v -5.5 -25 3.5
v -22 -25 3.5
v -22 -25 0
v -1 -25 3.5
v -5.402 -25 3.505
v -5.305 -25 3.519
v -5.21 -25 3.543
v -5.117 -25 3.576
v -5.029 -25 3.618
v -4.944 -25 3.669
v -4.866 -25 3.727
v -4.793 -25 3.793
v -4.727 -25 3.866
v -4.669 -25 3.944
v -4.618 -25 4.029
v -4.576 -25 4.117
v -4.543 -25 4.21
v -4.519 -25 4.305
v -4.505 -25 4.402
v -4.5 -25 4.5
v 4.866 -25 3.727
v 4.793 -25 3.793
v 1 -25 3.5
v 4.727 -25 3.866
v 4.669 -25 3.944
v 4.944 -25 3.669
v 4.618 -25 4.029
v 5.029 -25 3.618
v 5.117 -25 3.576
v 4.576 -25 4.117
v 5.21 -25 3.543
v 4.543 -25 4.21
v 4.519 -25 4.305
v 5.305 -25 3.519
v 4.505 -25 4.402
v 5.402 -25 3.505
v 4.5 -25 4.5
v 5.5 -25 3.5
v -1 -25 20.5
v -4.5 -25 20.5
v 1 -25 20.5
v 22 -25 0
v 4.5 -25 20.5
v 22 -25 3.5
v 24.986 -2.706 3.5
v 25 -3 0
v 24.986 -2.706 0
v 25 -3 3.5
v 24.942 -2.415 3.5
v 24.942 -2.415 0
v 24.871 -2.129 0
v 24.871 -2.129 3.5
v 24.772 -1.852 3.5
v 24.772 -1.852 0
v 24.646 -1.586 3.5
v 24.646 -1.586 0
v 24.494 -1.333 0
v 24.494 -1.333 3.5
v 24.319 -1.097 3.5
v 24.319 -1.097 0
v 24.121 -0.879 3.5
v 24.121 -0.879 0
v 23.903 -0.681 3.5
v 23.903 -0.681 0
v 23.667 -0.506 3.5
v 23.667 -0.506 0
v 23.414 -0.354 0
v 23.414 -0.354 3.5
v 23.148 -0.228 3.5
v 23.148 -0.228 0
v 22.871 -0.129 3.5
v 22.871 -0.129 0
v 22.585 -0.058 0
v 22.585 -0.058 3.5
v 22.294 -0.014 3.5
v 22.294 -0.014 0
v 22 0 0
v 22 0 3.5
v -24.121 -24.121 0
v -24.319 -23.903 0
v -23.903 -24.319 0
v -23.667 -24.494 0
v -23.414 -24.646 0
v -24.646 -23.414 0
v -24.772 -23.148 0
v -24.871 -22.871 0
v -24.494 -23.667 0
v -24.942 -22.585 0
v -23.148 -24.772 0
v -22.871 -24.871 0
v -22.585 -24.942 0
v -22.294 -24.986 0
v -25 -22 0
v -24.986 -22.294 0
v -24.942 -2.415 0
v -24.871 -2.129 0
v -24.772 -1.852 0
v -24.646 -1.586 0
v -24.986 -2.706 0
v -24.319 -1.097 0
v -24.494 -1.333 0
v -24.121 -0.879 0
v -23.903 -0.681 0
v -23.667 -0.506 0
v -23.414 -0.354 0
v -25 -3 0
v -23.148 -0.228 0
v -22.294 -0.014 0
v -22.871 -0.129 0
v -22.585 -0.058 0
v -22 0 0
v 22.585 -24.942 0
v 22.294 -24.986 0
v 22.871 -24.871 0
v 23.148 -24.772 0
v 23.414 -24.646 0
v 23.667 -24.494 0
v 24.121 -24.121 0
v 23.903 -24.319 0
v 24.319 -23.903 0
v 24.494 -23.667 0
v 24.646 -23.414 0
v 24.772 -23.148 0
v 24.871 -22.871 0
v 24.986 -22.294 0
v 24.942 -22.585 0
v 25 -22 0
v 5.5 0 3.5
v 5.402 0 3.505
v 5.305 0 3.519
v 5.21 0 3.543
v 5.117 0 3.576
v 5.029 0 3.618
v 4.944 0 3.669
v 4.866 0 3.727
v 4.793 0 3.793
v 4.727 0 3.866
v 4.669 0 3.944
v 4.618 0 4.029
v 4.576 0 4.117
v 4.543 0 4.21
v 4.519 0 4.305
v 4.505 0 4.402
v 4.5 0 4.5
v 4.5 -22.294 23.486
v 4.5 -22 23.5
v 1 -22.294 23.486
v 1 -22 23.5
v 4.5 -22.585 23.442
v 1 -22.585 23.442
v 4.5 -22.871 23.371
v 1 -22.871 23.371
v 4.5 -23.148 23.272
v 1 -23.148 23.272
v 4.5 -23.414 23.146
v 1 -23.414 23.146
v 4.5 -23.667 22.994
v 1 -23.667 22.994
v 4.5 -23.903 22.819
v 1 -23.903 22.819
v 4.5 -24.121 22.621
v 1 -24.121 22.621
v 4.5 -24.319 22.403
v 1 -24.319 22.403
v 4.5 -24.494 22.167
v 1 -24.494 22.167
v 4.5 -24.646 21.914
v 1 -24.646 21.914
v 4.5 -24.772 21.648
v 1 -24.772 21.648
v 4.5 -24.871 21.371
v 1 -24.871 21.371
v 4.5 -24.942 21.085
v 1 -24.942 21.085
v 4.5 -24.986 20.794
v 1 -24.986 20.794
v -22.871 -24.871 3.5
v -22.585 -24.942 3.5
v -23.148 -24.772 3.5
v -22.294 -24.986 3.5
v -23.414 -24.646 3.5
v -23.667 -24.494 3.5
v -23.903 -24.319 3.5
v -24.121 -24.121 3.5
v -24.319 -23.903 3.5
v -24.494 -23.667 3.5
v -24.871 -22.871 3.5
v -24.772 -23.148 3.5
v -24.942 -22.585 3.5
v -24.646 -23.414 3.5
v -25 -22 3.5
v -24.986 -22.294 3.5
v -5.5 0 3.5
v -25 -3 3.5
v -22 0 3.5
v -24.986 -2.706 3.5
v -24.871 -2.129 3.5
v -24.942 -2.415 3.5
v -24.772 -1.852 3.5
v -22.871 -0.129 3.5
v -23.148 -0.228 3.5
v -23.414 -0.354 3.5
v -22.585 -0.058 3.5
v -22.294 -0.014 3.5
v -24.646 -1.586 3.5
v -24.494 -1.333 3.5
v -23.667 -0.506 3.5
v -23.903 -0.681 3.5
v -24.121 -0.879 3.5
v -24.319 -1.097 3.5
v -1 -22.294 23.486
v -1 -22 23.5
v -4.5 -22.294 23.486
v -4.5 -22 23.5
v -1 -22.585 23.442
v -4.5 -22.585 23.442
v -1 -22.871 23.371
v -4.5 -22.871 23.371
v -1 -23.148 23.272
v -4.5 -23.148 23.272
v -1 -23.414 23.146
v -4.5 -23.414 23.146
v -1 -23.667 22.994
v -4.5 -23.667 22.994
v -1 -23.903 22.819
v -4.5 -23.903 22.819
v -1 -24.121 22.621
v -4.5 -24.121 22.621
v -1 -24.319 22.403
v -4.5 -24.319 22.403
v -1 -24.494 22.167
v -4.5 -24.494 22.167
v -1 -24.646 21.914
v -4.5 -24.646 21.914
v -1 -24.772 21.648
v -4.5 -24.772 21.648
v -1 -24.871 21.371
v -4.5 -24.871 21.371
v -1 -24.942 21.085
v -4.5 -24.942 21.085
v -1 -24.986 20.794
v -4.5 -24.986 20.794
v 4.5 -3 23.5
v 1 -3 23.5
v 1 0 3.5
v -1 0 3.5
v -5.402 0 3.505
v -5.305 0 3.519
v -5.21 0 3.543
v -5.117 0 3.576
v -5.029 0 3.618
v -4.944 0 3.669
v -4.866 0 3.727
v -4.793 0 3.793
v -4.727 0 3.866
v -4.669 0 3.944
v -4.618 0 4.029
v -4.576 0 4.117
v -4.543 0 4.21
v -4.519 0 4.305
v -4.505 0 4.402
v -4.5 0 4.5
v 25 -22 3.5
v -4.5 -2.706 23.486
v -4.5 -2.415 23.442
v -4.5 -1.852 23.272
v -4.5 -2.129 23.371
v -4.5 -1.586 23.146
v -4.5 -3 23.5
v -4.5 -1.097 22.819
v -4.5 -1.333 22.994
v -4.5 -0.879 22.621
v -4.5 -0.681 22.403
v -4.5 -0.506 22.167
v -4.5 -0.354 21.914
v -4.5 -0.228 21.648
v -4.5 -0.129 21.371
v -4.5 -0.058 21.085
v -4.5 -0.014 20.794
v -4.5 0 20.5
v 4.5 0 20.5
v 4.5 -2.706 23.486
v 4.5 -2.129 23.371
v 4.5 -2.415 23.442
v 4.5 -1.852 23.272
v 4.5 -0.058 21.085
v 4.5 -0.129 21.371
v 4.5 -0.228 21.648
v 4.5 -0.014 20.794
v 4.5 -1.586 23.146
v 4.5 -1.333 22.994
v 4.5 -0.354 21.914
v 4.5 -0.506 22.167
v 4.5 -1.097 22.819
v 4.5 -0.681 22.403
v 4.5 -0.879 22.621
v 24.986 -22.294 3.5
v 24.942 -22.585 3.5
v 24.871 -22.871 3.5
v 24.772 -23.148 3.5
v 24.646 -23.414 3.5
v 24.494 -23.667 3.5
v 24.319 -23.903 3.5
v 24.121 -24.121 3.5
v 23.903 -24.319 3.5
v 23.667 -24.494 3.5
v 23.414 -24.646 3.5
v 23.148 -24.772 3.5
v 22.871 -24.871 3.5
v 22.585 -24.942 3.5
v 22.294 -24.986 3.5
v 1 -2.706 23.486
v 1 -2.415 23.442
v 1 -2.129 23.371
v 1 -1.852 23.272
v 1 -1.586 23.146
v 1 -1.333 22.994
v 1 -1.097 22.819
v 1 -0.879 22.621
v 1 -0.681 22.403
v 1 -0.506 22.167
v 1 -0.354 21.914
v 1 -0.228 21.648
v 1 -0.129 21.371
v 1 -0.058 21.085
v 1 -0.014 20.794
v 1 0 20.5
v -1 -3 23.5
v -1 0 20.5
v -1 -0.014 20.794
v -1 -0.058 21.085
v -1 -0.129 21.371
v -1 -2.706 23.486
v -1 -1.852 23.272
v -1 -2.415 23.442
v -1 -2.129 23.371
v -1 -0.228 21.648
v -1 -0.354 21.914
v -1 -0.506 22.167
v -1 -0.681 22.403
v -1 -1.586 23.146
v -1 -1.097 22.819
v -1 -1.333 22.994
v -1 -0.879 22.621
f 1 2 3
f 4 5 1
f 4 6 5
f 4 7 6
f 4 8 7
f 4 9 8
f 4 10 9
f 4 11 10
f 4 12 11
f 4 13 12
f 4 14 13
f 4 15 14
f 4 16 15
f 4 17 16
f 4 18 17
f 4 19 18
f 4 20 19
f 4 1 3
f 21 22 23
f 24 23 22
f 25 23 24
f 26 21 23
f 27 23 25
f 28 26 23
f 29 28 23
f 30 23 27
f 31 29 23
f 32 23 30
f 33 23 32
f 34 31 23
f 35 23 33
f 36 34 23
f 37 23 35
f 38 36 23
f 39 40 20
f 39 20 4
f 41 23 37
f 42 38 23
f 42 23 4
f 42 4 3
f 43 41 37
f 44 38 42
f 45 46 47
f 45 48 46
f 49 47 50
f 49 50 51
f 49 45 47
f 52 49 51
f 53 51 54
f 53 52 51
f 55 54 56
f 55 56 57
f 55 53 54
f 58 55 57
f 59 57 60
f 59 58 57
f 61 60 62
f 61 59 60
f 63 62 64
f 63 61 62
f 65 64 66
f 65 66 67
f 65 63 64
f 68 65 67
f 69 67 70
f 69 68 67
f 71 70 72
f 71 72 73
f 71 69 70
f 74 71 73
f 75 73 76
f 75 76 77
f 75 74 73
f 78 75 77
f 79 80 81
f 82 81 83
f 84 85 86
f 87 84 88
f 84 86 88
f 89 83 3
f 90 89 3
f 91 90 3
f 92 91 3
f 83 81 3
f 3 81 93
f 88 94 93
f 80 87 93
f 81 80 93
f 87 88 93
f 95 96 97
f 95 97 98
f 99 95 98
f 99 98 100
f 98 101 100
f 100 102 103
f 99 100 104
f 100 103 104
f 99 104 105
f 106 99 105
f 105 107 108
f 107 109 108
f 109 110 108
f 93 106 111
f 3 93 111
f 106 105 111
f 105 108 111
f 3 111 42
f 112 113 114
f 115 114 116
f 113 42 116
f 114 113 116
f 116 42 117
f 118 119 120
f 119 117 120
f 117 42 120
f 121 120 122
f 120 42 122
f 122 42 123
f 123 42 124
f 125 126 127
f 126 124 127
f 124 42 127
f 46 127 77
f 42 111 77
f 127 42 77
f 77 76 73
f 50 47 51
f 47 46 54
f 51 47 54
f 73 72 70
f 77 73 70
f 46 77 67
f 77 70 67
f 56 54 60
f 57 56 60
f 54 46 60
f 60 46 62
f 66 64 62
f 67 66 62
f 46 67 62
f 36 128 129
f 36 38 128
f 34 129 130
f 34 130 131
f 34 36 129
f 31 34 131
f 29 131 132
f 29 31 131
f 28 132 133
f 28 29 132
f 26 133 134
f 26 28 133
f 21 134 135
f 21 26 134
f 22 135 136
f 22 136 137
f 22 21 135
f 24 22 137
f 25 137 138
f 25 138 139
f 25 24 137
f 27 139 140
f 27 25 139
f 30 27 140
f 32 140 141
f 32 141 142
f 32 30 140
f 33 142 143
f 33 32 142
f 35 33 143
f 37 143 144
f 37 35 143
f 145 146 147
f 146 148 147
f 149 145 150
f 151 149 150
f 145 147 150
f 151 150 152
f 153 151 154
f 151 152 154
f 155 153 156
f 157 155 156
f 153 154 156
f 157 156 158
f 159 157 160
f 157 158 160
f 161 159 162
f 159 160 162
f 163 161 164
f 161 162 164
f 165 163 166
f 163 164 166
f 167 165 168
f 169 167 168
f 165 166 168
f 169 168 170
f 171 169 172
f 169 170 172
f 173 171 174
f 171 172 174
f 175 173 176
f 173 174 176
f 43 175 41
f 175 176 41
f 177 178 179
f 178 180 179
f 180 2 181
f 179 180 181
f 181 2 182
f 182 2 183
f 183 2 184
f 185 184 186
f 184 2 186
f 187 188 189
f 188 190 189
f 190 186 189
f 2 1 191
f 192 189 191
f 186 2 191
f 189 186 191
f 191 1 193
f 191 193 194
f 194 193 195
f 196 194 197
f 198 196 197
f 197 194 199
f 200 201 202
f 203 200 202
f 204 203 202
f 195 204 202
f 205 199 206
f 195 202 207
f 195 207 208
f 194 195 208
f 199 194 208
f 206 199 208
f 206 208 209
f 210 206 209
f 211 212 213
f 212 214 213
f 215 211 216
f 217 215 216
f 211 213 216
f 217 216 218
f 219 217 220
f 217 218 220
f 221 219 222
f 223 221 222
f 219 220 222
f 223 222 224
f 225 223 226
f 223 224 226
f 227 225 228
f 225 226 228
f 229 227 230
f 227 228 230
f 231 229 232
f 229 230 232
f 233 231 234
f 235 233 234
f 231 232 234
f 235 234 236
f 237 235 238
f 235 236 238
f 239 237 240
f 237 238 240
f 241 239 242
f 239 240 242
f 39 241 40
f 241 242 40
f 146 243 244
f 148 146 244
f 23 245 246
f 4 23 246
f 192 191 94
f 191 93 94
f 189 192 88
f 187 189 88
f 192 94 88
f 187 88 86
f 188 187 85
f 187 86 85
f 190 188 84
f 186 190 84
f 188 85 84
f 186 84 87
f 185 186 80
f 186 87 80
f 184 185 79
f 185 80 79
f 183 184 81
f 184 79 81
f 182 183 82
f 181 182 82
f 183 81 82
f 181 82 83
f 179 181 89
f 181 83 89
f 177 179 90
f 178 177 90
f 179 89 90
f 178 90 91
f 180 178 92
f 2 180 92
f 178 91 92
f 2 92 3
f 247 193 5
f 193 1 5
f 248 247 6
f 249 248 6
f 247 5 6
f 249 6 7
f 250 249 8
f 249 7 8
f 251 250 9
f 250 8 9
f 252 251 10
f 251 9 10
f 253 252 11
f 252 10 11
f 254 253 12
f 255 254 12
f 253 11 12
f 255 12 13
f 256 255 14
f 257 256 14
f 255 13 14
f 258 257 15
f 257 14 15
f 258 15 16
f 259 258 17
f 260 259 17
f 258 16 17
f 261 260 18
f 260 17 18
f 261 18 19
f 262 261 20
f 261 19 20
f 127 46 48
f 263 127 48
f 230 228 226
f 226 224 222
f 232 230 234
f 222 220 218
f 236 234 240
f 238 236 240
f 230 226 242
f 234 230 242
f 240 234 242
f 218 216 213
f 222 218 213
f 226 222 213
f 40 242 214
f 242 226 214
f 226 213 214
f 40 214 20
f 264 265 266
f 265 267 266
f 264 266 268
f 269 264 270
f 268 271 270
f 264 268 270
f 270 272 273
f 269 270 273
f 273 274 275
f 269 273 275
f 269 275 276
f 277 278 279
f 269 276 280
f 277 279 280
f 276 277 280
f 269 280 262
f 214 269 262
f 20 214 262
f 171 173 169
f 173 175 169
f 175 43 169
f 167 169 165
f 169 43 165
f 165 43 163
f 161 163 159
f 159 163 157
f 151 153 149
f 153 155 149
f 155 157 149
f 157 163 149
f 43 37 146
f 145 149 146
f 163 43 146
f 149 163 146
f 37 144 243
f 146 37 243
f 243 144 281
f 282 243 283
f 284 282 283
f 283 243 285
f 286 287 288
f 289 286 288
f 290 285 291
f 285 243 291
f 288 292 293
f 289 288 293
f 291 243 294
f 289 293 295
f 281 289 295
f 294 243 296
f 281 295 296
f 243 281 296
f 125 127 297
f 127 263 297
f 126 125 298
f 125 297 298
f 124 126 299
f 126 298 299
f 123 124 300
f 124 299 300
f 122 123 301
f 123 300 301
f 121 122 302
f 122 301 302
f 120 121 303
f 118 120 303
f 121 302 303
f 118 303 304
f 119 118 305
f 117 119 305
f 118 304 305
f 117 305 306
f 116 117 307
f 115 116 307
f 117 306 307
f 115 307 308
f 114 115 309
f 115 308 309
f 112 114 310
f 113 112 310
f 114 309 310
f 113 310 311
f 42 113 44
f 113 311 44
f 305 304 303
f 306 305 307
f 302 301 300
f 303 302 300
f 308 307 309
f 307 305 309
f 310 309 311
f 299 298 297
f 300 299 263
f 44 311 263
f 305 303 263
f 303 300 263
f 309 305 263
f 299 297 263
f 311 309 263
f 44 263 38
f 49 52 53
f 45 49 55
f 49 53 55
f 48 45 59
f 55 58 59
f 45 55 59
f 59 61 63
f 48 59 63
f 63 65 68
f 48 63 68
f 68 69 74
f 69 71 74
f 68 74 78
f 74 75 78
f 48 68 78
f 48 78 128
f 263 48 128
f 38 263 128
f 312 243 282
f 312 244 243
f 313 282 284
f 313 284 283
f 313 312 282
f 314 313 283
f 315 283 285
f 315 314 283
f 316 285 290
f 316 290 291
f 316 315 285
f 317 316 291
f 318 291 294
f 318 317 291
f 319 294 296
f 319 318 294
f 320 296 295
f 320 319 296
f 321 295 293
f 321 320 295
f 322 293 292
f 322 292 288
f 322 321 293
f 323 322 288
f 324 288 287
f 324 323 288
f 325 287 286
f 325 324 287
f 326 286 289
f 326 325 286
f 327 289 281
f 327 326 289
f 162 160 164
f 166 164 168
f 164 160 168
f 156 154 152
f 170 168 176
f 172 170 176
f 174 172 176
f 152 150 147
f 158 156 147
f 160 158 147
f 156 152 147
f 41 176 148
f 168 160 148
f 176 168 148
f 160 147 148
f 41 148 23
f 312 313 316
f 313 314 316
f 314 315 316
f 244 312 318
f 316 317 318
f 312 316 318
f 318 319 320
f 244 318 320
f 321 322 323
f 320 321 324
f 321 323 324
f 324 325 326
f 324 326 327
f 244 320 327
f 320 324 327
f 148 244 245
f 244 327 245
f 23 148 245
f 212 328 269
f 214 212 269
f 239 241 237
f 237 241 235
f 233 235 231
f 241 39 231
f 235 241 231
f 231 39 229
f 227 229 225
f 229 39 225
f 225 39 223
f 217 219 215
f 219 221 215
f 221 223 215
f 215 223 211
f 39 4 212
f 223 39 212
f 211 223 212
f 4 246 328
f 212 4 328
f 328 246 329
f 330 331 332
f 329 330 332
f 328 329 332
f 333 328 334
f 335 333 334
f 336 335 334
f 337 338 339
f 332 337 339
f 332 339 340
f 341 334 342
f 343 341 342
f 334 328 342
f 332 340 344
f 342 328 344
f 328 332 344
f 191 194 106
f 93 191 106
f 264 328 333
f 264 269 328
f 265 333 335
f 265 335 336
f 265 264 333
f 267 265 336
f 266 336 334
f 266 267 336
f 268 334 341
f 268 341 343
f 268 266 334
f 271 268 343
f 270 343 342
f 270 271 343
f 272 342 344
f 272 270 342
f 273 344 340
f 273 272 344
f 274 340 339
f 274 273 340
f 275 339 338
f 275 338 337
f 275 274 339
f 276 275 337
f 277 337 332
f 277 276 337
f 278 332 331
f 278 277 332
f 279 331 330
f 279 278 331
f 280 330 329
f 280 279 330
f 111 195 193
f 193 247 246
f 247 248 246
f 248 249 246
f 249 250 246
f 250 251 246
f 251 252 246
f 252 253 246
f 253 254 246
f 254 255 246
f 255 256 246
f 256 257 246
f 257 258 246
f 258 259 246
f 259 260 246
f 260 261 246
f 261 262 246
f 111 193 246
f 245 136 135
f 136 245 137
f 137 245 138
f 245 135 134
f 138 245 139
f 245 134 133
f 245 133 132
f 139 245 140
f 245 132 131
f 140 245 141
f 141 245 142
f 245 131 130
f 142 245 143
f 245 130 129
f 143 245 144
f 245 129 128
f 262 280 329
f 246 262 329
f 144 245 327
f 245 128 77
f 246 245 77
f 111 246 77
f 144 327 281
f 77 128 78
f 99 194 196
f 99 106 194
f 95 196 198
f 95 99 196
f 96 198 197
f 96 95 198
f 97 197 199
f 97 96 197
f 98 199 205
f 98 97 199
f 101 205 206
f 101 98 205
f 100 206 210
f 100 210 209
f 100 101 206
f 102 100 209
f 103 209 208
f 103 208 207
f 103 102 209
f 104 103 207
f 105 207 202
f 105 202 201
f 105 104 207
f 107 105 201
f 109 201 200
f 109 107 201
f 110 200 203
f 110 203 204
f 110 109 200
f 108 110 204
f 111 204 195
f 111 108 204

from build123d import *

# Parameters (mm, degrees)
F1_DEPTH = 25
F2_R     = 3
F3_R     = 1


with BuildPart() as f1:
    # F0 (on Front) → F1 (new body)
    with BuildSketch(Plane.XZ):
        Polygon((-25, 3.5), (-25, 0), (25, 0), (25, 3.5), (4.5, 3.5), (4.5, 23.5), (1, 23.5), (1, 3.5), (-1, 3.5), (-1, 23.5), (-4.5, 23.5), (-4.5, 3.5), align=None)
    extrude(amount=F1_DEPTH)

    # F2
    f2_edges = [f1.edges().sort_by_distance(p)[0] for p in [
        (-25, -25, 1.75),
        (-25, 0, 1.75),
        (-2.75, 0, 23.5),
        (-2.75, -25, 23.5),
        (2.75, -25, 23.5),
        (2.75, 0, 23.5),
        (25, -25, 1.75),
        (25, 0, 1.75),
    ]]
    fillet(f2_edges, radius=F2_R)

    # F3
    f3_edges = [f1.edges().sort_by_distance(p)[0] for p in [
        (-4.5, -12.5, 3.5),
        (4.5, -12.5, 3.5),
    ]]
    fillet(f3_edges, radius=F3_R)


solid = f1.part
